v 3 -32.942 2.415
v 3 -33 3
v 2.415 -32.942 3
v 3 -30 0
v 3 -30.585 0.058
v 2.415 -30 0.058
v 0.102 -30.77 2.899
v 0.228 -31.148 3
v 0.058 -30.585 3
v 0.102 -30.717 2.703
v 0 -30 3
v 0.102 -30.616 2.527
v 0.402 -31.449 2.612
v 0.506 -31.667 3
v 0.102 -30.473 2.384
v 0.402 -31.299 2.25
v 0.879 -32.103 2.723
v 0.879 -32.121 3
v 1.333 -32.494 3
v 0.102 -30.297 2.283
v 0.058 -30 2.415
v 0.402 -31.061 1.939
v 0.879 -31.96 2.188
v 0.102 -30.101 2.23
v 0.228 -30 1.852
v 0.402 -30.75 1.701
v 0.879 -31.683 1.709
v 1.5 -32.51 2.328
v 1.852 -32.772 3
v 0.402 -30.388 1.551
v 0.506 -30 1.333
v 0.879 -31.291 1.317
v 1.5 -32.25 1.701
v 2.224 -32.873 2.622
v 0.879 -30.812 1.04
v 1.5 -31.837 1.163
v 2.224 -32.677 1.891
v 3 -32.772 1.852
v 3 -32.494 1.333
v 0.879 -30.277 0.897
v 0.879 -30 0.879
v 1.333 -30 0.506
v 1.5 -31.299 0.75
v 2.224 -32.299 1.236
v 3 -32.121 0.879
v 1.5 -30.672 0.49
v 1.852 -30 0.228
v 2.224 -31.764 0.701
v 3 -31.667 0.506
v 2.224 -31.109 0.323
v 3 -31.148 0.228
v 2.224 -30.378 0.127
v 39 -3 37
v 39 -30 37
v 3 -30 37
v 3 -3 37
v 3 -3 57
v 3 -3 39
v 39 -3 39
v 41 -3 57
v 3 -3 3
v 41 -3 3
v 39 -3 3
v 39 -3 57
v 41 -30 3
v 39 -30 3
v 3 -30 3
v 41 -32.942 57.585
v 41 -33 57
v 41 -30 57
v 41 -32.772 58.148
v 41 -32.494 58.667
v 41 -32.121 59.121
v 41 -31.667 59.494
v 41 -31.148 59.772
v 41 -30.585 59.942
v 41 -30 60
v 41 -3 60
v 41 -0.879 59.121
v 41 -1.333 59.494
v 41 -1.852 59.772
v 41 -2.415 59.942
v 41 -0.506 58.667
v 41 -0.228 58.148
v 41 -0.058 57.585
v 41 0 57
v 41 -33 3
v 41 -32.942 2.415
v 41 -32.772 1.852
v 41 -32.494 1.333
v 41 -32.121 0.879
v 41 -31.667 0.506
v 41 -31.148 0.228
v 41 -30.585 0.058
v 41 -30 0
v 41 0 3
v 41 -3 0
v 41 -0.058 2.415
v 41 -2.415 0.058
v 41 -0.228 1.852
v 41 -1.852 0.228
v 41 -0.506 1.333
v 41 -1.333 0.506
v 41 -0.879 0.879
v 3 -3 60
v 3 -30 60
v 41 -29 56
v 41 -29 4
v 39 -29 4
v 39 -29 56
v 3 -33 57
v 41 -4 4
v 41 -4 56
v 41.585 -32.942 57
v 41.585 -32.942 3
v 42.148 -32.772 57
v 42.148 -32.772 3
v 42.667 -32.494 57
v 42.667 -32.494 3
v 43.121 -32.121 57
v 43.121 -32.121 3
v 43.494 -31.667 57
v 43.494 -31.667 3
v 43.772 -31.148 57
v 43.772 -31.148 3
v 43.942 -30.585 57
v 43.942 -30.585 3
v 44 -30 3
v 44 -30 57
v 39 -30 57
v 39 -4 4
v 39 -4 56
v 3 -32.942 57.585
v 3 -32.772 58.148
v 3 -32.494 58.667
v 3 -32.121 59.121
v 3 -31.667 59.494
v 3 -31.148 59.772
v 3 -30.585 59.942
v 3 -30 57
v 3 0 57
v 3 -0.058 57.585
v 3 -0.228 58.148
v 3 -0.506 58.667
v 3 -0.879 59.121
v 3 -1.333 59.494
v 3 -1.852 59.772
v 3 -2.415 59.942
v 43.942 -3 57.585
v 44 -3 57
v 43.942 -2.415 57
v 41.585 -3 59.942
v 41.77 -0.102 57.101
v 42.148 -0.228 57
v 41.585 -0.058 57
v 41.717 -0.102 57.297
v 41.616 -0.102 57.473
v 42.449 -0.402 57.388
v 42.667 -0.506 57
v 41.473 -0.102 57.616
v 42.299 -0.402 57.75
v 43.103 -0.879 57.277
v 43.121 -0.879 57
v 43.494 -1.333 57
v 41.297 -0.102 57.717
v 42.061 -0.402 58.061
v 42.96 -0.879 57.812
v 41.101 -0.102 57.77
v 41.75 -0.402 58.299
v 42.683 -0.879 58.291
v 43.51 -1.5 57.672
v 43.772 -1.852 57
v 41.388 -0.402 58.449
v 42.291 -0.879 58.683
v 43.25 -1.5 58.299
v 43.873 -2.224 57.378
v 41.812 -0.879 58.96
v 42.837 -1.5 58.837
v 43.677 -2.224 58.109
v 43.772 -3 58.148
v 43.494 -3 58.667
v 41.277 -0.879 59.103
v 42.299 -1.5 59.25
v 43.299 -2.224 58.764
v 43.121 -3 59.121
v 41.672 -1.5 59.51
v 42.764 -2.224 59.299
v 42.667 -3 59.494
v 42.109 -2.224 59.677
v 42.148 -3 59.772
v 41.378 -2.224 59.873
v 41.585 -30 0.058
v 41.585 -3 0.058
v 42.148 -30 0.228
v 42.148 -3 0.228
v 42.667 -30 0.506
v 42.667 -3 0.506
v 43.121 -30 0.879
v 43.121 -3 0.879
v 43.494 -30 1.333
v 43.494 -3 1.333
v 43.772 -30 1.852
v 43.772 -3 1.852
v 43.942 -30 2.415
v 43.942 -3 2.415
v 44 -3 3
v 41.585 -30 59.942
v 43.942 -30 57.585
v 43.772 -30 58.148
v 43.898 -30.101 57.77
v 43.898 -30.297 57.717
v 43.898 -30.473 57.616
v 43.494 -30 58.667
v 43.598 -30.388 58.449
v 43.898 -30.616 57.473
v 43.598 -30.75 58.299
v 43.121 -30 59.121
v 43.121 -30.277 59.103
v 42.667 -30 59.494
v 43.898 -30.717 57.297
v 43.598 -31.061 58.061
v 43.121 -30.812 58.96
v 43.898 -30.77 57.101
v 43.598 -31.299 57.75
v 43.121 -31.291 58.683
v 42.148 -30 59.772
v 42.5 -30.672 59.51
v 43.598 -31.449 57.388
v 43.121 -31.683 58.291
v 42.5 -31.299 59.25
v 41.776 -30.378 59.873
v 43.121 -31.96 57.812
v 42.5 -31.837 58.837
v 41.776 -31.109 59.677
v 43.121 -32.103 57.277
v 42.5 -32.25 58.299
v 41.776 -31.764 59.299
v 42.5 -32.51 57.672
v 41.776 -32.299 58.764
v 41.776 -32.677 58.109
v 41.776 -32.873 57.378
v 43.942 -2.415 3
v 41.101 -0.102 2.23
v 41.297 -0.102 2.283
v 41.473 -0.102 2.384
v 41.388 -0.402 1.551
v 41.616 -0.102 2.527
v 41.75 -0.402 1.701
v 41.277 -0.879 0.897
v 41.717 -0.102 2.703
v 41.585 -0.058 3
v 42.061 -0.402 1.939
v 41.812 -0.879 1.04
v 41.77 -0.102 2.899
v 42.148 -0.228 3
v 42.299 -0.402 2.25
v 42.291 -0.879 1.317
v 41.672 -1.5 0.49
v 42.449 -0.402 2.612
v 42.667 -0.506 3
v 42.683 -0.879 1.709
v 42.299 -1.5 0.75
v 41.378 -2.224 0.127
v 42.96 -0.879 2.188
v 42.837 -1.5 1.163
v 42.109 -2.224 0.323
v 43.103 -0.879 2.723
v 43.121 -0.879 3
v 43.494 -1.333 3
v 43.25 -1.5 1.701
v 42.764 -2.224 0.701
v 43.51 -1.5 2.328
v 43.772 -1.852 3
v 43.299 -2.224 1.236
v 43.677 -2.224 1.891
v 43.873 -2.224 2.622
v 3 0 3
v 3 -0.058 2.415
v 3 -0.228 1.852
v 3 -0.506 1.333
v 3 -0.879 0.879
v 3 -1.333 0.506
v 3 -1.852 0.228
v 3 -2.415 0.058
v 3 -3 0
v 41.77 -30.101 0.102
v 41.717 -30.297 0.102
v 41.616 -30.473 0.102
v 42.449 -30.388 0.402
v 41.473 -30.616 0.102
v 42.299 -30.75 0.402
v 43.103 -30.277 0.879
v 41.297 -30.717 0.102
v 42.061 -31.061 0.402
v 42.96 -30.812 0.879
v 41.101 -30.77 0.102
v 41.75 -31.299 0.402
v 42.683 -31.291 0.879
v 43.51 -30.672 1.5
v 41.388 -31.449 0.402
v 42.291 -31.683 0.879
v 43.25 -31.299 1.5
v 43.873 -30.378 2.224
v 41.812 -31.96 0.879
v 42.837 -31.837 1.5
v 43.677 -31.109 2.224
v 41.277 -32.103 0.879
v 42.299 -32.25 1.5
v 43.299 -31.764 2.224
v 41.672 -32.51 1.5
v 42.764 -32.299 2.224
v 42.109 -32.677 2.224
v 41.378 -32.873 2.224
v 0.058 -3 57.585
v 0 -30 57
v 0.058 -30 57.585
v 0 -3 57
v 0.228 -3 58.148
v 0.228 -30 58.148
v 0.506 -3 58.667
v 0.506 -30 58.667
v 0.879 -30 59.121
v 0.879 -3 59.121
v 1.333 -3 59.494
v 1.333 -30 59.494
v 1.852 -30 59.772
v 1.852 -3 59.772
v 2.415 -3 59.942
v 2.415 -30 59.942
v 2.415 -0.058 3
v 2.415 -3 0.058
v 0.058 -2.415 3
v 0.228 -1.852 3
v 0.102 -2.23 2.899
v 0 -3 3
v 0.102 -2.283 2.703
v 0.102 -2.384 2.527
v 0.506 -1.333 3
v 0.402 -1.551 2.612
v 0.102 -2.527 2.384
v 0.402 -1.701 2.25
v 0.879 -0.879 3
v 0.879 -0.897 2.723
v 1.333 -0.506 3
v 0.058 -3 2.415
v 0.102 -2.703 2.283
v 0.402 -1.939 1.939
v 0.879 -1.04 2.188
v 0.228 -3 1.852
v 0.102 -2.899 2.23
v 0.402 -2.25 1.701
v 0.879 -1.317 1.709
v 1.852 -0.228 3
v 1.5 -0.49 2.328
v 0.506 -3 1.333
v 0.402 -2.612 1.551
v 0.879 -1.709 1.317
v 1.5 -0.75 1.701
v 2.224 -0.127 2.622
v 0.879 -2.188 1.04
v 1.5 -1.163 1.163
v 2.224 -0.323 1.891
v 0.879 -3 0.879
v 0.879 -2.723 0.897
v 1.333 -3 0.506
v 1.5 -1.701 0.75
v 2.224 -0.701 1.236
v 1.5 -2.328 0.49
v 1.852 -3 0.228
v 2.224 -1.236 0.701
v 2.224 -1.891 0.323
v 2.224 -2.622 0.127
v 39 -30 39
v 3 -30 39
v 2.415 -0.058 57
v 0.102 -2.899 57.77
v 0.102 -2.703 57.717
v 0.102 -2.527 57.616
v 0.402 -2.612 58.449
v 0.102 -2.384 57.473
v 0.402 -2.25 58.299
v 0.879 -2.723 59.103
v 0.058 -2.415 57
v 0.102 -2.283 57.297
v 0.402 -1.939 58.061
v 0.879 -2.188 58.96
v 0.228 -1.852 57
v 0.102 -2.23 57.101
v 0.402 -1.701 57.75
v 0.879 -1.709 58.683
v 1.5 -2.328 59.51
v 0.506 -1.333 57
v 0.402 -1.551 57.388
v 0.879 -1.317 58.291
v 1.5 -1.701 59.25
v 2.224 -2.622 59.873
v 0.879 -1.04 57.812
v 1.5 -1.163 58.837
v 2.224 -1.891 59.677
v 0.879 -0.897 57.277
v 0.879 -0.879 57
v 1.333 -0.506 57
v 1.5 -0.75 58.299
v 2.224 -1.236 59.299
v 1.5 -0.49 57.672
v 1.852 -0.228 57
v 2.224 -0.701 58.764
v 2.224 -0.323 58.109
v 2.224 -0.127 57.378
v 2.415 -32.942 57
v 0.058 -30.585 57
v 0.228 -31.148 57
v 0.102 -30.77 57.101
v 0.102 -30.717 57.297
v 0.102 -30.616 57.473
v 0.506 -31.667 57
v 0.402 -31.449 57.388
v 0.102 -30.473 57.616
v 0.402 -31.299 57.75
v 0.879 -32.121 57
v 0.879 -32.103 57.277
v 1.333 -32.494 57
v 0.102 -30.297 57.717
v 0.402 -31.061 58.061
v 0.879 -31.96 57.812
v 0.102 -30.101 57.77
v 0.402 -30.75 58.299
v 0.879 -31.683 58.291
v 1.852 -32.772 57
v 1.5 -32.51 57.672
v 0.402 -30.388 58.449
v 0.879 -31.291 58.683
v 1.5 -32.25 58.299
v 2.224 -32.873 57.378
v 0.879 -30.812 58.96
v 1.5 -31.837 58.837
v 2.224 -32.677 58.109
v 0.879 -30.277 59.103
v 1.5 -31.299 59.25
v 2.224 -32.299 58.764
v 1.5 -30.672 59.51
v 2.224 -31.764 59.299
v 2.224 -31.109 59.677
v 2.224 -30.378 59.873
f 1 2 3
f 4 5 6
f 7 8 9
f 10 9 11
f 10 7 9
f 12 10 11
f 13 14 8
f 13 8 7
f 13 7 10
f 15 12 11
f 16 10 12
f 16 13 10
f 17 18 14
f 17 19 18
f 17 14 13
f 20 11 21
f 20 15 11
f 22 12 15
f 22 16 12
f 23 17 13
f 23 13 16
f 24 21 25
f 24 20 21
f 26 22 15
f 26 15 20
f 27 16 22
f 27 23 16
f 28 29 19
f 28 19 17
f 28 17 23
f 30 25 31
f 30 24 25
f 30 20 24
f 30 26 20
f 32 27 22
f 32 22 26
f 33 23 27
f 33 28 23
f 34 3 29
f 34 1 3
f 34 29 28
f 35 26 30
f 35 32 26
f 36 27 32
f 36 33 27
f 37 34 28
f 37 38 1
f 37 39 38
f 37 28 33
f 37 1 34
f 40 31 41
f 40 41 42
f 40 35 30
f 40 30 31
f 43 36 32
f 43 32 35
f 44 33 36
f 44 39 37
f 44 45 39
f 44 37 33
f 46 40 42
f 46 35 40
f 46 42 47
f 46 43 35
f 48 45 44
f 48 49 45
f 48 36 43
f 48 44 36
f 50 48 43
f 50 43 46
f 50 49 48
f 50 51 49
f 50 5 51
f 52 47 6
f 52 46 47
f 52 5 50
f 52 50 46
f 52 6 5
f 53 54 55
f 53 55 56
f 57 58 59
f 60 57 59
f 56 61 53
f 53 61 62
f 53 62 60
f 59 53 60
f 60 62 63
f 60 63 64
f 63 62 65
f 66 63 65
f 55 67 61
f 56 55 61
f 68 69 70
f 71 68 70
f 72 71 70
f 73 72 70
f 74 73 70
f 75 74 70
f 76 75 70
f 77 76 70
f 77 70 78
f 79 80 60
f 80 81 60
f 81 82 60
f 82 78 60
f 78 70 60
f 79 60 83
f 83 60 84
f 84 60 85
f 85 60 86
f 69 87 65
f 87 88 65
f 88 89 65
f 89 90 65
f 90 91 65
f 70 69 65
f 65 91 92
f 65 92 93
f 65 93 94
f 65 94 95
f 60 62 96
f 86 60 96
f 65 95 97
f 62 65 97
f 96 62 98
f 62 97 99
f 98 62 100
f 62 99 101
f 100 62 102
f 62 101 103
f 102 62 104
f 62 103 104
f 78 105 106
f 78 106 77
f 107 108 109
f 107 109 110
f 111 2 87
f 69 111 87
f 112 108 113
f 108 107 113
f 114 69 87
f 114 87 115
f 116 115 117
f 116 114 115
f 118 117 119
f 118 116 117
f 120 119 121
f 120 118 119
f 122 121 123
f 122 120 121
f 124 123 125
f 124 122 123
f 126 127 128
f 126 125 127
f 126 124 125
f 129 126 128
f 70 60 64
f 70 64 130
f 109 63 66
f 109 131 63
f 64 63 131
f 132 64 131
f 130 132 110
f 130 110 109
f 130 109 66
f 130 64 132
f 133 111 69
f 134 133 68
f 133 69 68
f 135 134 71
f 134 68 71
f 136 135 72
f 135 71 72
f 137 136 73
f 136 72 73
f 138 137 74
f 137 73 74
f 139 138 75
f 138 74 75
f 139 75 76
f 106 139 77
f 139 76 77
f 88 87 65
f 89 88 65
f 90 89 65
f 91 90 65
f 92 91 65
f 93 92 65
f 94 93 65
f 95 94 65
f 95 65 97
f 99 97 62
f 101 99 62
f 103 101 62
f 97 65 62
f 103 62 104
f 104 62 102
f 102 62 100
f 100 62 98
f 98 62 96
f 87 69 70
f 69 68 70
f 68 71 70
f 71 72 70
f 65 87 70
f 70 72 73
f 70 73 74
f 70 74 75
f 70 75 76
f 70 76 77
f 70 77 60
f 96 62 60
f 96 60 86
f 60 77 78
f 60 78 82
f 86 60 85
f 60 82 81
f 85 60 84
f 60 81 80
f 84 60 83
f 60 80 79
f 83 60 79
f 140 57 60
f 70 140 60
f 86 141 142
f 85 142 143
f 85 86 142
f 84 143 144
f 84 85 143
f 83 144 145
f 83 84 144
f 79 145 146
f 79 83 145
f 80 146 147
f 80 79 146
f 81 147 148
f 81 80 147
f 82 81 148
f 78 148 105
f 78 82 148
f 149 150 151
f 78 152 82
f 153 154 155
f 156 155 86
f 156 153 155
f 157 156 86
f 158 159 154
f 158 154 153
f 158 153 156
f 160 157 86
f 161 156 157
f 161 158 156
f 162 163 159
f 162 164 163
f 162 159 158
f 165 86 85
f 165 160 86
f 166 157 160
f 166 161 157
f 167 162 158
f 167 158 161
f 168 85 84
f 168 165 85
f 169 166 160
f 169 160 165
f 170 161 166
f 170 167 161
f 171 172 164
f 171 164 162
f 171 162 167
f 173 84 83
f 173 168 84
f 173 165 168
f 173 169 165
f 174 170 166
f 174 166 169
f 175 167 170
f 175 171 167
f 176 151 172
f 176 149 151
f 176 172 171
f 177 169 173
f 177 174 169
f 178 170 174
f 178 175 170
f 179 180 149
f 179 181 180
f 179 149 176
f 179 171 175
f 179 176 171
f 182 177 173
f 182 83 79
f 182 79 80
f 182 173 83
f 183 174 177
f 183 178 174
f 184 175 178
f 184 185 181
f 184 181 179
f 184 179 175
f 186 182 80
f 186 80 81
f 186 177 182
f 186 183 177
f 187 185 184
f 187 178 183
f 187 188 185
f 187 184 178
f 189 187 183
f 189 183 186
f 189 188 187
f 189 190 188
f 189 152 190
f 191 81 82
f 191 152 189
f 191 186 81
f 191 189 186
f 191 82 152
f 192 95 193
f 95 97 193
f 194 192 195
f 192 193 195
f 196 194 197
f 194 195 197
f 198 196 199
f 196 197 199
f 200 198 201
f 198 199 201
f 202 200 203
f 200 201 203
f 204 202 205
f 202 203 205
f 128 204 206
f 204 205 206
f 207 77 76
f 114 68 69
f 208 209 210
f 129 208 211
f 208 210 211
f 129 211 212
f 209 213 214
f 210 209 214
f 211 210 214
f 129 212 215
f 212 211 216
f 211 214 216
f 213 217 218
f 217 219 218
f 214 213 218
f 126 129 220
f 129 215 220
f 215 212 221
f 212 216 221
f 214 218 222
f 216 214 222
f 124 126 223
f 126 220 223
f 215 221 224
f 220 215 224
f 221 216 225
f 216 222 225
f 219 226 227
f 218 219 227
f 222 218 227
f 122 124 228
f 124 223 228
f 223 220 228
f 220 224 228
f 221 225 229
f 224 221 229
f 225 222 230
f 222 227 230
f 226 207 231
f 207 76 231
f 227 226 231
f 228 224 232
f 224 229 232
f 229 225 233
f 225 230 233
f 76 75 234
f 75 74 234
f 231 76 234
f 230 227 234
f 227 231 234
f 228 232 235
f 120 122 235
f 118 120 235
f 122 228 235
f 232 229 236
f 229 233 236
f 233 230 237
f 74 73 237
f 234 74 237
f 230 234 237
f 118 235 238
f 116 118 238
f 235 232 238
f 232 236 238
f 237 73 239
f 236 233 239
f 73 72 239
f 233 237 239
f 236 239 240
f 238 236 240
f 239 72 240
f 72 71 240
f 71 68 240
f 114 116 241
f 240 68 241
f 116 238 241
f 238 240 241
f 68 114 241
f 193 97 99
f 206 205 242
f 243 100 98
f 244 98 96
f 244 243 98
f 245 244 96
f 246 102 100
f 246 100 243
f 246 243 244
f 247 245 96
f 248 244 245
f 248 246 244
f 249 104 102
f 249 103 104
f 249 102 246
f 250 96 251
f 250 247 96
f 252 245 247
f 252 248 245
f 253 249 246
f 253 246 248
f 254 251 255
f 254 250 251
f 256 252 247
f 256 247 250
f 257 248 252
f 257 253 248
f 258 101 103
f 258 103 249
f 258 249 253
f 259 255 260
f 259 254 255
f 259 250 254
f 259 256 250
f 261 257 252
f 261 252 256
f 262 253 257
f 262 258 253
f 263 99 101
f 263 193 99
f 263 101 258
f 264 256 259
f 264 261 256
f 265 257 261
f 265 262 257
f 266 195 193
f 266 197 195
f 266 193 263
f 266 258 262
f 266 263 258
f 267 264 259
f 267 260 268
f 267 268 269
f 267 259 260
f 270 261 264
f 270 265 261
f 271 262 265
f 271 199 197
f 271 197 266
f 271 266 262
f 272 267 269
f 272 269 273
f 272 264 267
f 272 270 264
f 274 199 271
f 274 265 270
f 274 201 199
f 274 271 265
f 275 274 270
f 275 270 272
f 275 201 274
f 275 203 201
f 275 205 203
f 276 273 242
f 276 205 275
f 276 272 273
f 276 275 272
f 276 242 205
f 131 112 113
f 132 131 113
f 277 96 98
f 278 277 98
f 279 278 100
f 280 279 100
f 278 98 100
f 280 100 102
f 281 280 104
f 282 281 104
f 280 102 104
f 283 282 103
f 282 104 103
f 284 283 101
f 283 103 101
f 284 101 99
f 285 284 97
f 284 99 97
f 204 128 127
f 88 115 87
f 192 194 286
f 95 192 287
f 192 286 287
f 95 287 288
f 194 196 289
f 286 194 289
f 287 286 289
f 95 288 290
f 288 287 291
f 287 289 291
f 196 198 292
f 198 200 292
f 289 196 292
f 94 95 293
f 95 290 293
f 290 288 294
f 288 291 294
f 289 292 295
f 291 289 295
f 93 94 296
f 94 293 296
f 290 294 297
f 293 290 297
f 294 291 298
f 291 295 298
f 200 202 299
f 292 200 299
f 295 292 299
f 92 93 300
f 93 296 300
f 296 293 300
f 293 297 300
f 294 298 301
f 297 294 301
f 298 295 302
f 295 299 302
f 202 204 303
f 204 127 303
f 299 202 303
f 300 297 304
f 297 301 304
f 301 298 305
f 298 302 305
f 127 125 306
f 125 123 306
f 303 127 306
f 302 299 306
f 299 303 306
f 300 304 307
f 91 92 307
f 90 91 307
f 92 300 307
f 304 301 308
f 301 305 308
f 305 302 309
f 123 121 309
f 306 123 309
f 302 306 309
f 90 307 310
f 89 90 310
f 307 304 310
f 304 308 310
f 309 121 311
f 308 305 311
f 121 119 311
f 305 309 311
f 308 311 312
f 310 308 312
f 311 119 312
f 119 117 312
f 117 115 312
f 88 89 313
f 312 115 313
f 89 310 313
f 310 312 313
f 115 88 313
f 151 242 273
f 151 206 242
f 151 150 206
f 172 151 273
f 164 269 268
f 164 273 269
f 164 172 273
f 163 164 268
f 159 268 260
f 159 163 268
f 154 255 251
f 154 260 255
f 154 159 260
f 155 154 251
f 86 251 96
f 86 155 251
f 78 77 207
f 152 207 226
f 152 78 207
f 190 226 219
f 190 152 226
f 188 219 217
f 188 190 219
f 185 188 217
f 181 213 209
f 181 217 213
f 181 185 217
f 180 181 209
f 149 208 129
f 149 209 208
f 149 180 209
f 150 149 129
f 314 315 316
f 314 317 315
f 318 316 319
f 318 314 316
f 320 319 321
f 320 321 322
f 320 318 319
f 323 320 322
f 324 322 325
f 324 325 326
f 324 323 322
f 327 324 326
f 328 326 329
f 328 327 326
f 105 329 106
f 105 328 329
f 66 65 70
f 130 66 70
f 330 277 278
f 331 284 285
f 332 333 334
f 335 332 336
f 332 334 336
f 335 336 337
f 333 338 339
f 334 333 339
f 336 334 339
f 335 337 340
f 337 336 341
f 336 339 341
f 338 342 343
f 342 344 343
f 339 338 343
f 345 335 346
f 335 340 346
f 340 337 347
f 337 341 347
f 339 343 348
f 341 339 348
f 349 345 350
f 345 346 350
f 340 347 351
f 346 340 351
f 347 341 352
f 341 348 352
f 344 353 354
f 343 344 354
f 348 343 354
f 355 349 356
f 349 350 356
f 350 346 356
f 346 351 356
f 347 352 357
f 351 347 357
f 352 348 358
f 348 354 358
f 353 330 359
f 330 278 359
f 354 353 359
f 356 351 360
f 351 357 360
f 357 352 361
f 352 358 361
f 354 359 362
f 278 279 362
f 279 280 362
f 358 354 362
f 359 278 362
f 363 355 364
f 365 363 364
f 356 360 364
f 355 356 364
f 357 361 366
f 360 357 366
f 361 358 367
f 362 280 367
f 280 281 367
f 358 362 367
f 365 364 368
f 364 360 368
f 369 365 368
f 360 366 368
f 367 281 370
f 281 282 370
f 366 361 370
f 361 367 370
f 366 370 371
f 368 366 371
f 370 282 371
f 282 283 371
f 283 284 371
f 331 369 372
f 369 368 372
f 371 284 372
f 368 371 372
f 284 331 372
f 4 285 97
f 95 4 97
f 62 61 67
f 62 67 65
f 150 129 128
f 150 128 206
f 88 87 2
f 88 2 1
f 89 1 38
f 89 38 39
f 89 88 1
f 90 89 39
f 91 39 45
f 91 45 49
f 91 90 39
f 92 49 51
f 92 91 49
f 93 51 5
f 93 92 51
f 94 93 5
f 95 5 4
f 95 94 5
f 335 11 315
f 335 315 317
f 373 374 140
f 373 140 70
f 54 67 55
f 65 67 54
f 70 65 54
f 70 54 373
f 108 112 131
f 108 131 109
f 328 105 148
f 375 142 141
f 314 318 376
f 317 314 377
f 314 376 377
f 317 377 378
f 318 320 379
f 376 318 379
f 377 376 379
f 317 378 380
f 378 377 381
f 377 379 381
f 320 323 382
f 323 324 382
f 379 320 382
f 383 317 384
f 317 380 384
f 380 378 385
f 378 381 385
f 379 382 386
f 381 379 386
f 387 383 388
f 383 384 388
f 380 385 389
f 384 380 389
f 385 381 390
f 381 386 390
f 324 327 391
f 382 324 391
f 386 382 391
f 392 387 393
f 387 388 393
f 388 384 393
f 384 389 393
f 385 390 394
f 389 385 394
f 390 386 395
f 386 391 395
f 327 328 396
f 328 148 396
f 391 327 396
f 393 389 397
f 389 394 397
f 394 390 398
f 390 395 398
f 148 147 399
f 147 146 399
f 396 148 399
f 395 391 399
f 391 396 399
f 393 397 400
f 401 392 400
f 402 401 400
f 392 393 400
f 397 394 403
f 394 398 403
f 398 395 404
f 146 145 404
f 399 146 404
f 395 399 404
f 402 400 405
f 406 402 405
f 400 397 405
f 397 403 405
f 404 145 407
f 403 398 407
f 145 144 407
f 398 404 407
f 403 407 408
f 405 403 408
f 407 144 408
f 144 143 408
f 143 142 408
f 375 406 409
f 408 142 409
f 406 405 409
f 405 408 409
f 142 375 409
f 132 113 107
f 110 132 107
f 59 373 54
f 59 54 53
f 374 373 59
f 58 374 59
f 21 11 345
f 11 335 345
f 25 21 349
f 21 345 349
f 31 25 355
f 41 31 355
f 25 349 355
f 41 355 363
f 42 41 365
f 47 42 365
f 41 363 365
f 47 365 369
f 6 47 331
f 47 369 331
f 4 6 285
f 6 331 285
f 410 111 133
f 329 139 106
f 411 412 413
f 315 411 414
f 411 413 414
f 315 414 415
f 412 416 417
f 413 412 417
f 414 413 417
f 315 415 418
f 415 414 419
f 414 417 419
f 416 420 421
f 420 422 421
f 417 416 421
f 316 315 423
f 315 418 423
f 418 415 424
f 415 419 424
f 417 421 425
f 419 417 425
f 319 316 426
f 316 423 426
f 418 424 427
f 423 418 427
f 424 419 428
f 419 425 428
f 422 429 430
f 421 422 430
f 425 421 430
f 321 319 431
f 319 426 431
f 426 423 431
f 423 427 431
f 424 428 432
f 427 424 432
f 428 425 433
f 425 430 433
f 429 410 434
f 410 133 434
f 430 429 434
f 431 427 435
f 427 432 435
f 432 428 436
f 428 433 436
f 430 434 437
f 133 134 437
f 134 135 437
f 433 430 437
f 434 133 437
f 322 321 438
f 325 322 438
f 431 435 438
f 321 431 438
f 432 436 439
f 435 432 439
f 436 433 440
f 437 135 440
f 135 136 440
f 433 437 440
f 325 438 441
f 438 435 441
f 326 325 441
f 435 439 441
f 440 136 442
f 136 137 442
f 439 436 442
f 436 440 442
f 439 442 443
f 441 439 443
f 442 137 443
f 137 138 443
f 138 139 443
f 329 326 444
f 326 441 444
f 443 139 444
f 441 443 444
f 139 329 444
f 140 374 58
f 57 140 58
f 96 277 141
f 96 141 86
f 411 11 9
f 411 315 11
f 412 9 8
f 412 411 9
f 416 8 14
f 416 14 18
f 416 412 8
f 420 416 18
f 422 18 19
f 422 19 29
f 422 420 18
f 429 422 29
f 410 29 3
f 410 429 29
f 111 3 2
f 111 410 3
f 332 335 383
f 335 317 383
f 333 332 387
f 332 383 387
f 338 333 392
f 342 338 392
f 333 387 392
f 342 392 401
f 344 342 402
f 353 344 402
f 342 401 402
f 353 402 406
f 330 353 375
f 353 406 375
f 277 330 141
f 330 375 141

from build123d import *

# Parameters (mm, degrees)
F0_W     = 41
F0_H     = 33
F1_DEPTH = 60
F2_T     = -3
F3_W     = 27
F3_H     = 2
F4_DEPTH = 36
F5_W     = 33
F5_H     = 60
F6_DEPTH = 3
F7_W     = 27
F7_H     = 54
F7_W_2   = 25
F7_H_2   = 52
F8_DEPTH = 2
F9_R     = 3
F10_R    = 2.99999


# Not quite as in the source:
# - a fillet or chamfer is up to 0.001 mm smaller than in the source, because OpenCascade refuses the exact size


with BuildPart() as f1:
    # F0 (on Top) → F1 (new body)
    with BuildSketch(Plane.XY):
        with Locations((20.5, -16.5)):
            Rectangle(F0_W, F0_H)
    extrude(amount=F1_DEPTH)

    # F2
    f2_openings = [f1.faces().sort_by_distance(p)[0] for p in [
        (41, -16.5, 30),
    ]]
    offset(amount=F2_T, openings=f2_openings)

    # F3 (on face) → F4 (join)
    with BuildSketch(Plane.YZ.offset(3)):
        with Locations((-16.5, 38)):
            Rectangle(F3_W, F3_H)
    extrude(amount=F4_DEPTH)

    # F9
    f9_edges = [f1.edges().sort_by_distance(p)[0] for p in [
        (20.5, -33, 60),
        (20.5, 0, 60),
        (20.5, 0, 0),
        (20.5, -33, 0),
        (0, -33, 30),
        (0, -16.5, 60),
        (0, 0, 30),
        (0, -16.5, 0),
    ]]
    fillet(f9_edges, radius=F9_R)


with BuildPart() as f6:
    # F5 (on face) → F6 (new body)
    with BuildSketch(Plane.YZ.offset(41)):
        with Locations((-16.5, 30)):
            Rectangle(F5_W, F5_H)
    extrude(amount=F6_DEPTH)

    # F7 (on face) → F8 (join)
    with BuildSketch(Plane(origin=(41, 0, 0), x_dir=(0, -1, 0), z_dir=(-1, 0, 0))):
        with Locations((16.5, 30)):
            Rectangle(F7_W, F7_H)
        with Locations((16.5, 30)):
            Rectangle(F7_W_2, F7_H_2, mode=Mode.SUBTRACT)
    extrude(amount=F8_DEPTH)

    # F10 (radius 3 in the source; OpenCascade refuses exactly that, so slightly less here)
    f10_edges = [f6.edges().sort_by_distance(p)[0] for p in [
        (42.5, -33, 60),
        (44, -16.5, 60),
        (44, -33, 30),
        (44, -16.5, 0),
        (42.5, -33, 0),
        (42.5, 0, 0),
        (44, 0, 30),
        (42.5, 0, 60),
    ]]
    fillet(f10_edges, radius=F10_R)


solid = Compound([f1.part, f6.part])
